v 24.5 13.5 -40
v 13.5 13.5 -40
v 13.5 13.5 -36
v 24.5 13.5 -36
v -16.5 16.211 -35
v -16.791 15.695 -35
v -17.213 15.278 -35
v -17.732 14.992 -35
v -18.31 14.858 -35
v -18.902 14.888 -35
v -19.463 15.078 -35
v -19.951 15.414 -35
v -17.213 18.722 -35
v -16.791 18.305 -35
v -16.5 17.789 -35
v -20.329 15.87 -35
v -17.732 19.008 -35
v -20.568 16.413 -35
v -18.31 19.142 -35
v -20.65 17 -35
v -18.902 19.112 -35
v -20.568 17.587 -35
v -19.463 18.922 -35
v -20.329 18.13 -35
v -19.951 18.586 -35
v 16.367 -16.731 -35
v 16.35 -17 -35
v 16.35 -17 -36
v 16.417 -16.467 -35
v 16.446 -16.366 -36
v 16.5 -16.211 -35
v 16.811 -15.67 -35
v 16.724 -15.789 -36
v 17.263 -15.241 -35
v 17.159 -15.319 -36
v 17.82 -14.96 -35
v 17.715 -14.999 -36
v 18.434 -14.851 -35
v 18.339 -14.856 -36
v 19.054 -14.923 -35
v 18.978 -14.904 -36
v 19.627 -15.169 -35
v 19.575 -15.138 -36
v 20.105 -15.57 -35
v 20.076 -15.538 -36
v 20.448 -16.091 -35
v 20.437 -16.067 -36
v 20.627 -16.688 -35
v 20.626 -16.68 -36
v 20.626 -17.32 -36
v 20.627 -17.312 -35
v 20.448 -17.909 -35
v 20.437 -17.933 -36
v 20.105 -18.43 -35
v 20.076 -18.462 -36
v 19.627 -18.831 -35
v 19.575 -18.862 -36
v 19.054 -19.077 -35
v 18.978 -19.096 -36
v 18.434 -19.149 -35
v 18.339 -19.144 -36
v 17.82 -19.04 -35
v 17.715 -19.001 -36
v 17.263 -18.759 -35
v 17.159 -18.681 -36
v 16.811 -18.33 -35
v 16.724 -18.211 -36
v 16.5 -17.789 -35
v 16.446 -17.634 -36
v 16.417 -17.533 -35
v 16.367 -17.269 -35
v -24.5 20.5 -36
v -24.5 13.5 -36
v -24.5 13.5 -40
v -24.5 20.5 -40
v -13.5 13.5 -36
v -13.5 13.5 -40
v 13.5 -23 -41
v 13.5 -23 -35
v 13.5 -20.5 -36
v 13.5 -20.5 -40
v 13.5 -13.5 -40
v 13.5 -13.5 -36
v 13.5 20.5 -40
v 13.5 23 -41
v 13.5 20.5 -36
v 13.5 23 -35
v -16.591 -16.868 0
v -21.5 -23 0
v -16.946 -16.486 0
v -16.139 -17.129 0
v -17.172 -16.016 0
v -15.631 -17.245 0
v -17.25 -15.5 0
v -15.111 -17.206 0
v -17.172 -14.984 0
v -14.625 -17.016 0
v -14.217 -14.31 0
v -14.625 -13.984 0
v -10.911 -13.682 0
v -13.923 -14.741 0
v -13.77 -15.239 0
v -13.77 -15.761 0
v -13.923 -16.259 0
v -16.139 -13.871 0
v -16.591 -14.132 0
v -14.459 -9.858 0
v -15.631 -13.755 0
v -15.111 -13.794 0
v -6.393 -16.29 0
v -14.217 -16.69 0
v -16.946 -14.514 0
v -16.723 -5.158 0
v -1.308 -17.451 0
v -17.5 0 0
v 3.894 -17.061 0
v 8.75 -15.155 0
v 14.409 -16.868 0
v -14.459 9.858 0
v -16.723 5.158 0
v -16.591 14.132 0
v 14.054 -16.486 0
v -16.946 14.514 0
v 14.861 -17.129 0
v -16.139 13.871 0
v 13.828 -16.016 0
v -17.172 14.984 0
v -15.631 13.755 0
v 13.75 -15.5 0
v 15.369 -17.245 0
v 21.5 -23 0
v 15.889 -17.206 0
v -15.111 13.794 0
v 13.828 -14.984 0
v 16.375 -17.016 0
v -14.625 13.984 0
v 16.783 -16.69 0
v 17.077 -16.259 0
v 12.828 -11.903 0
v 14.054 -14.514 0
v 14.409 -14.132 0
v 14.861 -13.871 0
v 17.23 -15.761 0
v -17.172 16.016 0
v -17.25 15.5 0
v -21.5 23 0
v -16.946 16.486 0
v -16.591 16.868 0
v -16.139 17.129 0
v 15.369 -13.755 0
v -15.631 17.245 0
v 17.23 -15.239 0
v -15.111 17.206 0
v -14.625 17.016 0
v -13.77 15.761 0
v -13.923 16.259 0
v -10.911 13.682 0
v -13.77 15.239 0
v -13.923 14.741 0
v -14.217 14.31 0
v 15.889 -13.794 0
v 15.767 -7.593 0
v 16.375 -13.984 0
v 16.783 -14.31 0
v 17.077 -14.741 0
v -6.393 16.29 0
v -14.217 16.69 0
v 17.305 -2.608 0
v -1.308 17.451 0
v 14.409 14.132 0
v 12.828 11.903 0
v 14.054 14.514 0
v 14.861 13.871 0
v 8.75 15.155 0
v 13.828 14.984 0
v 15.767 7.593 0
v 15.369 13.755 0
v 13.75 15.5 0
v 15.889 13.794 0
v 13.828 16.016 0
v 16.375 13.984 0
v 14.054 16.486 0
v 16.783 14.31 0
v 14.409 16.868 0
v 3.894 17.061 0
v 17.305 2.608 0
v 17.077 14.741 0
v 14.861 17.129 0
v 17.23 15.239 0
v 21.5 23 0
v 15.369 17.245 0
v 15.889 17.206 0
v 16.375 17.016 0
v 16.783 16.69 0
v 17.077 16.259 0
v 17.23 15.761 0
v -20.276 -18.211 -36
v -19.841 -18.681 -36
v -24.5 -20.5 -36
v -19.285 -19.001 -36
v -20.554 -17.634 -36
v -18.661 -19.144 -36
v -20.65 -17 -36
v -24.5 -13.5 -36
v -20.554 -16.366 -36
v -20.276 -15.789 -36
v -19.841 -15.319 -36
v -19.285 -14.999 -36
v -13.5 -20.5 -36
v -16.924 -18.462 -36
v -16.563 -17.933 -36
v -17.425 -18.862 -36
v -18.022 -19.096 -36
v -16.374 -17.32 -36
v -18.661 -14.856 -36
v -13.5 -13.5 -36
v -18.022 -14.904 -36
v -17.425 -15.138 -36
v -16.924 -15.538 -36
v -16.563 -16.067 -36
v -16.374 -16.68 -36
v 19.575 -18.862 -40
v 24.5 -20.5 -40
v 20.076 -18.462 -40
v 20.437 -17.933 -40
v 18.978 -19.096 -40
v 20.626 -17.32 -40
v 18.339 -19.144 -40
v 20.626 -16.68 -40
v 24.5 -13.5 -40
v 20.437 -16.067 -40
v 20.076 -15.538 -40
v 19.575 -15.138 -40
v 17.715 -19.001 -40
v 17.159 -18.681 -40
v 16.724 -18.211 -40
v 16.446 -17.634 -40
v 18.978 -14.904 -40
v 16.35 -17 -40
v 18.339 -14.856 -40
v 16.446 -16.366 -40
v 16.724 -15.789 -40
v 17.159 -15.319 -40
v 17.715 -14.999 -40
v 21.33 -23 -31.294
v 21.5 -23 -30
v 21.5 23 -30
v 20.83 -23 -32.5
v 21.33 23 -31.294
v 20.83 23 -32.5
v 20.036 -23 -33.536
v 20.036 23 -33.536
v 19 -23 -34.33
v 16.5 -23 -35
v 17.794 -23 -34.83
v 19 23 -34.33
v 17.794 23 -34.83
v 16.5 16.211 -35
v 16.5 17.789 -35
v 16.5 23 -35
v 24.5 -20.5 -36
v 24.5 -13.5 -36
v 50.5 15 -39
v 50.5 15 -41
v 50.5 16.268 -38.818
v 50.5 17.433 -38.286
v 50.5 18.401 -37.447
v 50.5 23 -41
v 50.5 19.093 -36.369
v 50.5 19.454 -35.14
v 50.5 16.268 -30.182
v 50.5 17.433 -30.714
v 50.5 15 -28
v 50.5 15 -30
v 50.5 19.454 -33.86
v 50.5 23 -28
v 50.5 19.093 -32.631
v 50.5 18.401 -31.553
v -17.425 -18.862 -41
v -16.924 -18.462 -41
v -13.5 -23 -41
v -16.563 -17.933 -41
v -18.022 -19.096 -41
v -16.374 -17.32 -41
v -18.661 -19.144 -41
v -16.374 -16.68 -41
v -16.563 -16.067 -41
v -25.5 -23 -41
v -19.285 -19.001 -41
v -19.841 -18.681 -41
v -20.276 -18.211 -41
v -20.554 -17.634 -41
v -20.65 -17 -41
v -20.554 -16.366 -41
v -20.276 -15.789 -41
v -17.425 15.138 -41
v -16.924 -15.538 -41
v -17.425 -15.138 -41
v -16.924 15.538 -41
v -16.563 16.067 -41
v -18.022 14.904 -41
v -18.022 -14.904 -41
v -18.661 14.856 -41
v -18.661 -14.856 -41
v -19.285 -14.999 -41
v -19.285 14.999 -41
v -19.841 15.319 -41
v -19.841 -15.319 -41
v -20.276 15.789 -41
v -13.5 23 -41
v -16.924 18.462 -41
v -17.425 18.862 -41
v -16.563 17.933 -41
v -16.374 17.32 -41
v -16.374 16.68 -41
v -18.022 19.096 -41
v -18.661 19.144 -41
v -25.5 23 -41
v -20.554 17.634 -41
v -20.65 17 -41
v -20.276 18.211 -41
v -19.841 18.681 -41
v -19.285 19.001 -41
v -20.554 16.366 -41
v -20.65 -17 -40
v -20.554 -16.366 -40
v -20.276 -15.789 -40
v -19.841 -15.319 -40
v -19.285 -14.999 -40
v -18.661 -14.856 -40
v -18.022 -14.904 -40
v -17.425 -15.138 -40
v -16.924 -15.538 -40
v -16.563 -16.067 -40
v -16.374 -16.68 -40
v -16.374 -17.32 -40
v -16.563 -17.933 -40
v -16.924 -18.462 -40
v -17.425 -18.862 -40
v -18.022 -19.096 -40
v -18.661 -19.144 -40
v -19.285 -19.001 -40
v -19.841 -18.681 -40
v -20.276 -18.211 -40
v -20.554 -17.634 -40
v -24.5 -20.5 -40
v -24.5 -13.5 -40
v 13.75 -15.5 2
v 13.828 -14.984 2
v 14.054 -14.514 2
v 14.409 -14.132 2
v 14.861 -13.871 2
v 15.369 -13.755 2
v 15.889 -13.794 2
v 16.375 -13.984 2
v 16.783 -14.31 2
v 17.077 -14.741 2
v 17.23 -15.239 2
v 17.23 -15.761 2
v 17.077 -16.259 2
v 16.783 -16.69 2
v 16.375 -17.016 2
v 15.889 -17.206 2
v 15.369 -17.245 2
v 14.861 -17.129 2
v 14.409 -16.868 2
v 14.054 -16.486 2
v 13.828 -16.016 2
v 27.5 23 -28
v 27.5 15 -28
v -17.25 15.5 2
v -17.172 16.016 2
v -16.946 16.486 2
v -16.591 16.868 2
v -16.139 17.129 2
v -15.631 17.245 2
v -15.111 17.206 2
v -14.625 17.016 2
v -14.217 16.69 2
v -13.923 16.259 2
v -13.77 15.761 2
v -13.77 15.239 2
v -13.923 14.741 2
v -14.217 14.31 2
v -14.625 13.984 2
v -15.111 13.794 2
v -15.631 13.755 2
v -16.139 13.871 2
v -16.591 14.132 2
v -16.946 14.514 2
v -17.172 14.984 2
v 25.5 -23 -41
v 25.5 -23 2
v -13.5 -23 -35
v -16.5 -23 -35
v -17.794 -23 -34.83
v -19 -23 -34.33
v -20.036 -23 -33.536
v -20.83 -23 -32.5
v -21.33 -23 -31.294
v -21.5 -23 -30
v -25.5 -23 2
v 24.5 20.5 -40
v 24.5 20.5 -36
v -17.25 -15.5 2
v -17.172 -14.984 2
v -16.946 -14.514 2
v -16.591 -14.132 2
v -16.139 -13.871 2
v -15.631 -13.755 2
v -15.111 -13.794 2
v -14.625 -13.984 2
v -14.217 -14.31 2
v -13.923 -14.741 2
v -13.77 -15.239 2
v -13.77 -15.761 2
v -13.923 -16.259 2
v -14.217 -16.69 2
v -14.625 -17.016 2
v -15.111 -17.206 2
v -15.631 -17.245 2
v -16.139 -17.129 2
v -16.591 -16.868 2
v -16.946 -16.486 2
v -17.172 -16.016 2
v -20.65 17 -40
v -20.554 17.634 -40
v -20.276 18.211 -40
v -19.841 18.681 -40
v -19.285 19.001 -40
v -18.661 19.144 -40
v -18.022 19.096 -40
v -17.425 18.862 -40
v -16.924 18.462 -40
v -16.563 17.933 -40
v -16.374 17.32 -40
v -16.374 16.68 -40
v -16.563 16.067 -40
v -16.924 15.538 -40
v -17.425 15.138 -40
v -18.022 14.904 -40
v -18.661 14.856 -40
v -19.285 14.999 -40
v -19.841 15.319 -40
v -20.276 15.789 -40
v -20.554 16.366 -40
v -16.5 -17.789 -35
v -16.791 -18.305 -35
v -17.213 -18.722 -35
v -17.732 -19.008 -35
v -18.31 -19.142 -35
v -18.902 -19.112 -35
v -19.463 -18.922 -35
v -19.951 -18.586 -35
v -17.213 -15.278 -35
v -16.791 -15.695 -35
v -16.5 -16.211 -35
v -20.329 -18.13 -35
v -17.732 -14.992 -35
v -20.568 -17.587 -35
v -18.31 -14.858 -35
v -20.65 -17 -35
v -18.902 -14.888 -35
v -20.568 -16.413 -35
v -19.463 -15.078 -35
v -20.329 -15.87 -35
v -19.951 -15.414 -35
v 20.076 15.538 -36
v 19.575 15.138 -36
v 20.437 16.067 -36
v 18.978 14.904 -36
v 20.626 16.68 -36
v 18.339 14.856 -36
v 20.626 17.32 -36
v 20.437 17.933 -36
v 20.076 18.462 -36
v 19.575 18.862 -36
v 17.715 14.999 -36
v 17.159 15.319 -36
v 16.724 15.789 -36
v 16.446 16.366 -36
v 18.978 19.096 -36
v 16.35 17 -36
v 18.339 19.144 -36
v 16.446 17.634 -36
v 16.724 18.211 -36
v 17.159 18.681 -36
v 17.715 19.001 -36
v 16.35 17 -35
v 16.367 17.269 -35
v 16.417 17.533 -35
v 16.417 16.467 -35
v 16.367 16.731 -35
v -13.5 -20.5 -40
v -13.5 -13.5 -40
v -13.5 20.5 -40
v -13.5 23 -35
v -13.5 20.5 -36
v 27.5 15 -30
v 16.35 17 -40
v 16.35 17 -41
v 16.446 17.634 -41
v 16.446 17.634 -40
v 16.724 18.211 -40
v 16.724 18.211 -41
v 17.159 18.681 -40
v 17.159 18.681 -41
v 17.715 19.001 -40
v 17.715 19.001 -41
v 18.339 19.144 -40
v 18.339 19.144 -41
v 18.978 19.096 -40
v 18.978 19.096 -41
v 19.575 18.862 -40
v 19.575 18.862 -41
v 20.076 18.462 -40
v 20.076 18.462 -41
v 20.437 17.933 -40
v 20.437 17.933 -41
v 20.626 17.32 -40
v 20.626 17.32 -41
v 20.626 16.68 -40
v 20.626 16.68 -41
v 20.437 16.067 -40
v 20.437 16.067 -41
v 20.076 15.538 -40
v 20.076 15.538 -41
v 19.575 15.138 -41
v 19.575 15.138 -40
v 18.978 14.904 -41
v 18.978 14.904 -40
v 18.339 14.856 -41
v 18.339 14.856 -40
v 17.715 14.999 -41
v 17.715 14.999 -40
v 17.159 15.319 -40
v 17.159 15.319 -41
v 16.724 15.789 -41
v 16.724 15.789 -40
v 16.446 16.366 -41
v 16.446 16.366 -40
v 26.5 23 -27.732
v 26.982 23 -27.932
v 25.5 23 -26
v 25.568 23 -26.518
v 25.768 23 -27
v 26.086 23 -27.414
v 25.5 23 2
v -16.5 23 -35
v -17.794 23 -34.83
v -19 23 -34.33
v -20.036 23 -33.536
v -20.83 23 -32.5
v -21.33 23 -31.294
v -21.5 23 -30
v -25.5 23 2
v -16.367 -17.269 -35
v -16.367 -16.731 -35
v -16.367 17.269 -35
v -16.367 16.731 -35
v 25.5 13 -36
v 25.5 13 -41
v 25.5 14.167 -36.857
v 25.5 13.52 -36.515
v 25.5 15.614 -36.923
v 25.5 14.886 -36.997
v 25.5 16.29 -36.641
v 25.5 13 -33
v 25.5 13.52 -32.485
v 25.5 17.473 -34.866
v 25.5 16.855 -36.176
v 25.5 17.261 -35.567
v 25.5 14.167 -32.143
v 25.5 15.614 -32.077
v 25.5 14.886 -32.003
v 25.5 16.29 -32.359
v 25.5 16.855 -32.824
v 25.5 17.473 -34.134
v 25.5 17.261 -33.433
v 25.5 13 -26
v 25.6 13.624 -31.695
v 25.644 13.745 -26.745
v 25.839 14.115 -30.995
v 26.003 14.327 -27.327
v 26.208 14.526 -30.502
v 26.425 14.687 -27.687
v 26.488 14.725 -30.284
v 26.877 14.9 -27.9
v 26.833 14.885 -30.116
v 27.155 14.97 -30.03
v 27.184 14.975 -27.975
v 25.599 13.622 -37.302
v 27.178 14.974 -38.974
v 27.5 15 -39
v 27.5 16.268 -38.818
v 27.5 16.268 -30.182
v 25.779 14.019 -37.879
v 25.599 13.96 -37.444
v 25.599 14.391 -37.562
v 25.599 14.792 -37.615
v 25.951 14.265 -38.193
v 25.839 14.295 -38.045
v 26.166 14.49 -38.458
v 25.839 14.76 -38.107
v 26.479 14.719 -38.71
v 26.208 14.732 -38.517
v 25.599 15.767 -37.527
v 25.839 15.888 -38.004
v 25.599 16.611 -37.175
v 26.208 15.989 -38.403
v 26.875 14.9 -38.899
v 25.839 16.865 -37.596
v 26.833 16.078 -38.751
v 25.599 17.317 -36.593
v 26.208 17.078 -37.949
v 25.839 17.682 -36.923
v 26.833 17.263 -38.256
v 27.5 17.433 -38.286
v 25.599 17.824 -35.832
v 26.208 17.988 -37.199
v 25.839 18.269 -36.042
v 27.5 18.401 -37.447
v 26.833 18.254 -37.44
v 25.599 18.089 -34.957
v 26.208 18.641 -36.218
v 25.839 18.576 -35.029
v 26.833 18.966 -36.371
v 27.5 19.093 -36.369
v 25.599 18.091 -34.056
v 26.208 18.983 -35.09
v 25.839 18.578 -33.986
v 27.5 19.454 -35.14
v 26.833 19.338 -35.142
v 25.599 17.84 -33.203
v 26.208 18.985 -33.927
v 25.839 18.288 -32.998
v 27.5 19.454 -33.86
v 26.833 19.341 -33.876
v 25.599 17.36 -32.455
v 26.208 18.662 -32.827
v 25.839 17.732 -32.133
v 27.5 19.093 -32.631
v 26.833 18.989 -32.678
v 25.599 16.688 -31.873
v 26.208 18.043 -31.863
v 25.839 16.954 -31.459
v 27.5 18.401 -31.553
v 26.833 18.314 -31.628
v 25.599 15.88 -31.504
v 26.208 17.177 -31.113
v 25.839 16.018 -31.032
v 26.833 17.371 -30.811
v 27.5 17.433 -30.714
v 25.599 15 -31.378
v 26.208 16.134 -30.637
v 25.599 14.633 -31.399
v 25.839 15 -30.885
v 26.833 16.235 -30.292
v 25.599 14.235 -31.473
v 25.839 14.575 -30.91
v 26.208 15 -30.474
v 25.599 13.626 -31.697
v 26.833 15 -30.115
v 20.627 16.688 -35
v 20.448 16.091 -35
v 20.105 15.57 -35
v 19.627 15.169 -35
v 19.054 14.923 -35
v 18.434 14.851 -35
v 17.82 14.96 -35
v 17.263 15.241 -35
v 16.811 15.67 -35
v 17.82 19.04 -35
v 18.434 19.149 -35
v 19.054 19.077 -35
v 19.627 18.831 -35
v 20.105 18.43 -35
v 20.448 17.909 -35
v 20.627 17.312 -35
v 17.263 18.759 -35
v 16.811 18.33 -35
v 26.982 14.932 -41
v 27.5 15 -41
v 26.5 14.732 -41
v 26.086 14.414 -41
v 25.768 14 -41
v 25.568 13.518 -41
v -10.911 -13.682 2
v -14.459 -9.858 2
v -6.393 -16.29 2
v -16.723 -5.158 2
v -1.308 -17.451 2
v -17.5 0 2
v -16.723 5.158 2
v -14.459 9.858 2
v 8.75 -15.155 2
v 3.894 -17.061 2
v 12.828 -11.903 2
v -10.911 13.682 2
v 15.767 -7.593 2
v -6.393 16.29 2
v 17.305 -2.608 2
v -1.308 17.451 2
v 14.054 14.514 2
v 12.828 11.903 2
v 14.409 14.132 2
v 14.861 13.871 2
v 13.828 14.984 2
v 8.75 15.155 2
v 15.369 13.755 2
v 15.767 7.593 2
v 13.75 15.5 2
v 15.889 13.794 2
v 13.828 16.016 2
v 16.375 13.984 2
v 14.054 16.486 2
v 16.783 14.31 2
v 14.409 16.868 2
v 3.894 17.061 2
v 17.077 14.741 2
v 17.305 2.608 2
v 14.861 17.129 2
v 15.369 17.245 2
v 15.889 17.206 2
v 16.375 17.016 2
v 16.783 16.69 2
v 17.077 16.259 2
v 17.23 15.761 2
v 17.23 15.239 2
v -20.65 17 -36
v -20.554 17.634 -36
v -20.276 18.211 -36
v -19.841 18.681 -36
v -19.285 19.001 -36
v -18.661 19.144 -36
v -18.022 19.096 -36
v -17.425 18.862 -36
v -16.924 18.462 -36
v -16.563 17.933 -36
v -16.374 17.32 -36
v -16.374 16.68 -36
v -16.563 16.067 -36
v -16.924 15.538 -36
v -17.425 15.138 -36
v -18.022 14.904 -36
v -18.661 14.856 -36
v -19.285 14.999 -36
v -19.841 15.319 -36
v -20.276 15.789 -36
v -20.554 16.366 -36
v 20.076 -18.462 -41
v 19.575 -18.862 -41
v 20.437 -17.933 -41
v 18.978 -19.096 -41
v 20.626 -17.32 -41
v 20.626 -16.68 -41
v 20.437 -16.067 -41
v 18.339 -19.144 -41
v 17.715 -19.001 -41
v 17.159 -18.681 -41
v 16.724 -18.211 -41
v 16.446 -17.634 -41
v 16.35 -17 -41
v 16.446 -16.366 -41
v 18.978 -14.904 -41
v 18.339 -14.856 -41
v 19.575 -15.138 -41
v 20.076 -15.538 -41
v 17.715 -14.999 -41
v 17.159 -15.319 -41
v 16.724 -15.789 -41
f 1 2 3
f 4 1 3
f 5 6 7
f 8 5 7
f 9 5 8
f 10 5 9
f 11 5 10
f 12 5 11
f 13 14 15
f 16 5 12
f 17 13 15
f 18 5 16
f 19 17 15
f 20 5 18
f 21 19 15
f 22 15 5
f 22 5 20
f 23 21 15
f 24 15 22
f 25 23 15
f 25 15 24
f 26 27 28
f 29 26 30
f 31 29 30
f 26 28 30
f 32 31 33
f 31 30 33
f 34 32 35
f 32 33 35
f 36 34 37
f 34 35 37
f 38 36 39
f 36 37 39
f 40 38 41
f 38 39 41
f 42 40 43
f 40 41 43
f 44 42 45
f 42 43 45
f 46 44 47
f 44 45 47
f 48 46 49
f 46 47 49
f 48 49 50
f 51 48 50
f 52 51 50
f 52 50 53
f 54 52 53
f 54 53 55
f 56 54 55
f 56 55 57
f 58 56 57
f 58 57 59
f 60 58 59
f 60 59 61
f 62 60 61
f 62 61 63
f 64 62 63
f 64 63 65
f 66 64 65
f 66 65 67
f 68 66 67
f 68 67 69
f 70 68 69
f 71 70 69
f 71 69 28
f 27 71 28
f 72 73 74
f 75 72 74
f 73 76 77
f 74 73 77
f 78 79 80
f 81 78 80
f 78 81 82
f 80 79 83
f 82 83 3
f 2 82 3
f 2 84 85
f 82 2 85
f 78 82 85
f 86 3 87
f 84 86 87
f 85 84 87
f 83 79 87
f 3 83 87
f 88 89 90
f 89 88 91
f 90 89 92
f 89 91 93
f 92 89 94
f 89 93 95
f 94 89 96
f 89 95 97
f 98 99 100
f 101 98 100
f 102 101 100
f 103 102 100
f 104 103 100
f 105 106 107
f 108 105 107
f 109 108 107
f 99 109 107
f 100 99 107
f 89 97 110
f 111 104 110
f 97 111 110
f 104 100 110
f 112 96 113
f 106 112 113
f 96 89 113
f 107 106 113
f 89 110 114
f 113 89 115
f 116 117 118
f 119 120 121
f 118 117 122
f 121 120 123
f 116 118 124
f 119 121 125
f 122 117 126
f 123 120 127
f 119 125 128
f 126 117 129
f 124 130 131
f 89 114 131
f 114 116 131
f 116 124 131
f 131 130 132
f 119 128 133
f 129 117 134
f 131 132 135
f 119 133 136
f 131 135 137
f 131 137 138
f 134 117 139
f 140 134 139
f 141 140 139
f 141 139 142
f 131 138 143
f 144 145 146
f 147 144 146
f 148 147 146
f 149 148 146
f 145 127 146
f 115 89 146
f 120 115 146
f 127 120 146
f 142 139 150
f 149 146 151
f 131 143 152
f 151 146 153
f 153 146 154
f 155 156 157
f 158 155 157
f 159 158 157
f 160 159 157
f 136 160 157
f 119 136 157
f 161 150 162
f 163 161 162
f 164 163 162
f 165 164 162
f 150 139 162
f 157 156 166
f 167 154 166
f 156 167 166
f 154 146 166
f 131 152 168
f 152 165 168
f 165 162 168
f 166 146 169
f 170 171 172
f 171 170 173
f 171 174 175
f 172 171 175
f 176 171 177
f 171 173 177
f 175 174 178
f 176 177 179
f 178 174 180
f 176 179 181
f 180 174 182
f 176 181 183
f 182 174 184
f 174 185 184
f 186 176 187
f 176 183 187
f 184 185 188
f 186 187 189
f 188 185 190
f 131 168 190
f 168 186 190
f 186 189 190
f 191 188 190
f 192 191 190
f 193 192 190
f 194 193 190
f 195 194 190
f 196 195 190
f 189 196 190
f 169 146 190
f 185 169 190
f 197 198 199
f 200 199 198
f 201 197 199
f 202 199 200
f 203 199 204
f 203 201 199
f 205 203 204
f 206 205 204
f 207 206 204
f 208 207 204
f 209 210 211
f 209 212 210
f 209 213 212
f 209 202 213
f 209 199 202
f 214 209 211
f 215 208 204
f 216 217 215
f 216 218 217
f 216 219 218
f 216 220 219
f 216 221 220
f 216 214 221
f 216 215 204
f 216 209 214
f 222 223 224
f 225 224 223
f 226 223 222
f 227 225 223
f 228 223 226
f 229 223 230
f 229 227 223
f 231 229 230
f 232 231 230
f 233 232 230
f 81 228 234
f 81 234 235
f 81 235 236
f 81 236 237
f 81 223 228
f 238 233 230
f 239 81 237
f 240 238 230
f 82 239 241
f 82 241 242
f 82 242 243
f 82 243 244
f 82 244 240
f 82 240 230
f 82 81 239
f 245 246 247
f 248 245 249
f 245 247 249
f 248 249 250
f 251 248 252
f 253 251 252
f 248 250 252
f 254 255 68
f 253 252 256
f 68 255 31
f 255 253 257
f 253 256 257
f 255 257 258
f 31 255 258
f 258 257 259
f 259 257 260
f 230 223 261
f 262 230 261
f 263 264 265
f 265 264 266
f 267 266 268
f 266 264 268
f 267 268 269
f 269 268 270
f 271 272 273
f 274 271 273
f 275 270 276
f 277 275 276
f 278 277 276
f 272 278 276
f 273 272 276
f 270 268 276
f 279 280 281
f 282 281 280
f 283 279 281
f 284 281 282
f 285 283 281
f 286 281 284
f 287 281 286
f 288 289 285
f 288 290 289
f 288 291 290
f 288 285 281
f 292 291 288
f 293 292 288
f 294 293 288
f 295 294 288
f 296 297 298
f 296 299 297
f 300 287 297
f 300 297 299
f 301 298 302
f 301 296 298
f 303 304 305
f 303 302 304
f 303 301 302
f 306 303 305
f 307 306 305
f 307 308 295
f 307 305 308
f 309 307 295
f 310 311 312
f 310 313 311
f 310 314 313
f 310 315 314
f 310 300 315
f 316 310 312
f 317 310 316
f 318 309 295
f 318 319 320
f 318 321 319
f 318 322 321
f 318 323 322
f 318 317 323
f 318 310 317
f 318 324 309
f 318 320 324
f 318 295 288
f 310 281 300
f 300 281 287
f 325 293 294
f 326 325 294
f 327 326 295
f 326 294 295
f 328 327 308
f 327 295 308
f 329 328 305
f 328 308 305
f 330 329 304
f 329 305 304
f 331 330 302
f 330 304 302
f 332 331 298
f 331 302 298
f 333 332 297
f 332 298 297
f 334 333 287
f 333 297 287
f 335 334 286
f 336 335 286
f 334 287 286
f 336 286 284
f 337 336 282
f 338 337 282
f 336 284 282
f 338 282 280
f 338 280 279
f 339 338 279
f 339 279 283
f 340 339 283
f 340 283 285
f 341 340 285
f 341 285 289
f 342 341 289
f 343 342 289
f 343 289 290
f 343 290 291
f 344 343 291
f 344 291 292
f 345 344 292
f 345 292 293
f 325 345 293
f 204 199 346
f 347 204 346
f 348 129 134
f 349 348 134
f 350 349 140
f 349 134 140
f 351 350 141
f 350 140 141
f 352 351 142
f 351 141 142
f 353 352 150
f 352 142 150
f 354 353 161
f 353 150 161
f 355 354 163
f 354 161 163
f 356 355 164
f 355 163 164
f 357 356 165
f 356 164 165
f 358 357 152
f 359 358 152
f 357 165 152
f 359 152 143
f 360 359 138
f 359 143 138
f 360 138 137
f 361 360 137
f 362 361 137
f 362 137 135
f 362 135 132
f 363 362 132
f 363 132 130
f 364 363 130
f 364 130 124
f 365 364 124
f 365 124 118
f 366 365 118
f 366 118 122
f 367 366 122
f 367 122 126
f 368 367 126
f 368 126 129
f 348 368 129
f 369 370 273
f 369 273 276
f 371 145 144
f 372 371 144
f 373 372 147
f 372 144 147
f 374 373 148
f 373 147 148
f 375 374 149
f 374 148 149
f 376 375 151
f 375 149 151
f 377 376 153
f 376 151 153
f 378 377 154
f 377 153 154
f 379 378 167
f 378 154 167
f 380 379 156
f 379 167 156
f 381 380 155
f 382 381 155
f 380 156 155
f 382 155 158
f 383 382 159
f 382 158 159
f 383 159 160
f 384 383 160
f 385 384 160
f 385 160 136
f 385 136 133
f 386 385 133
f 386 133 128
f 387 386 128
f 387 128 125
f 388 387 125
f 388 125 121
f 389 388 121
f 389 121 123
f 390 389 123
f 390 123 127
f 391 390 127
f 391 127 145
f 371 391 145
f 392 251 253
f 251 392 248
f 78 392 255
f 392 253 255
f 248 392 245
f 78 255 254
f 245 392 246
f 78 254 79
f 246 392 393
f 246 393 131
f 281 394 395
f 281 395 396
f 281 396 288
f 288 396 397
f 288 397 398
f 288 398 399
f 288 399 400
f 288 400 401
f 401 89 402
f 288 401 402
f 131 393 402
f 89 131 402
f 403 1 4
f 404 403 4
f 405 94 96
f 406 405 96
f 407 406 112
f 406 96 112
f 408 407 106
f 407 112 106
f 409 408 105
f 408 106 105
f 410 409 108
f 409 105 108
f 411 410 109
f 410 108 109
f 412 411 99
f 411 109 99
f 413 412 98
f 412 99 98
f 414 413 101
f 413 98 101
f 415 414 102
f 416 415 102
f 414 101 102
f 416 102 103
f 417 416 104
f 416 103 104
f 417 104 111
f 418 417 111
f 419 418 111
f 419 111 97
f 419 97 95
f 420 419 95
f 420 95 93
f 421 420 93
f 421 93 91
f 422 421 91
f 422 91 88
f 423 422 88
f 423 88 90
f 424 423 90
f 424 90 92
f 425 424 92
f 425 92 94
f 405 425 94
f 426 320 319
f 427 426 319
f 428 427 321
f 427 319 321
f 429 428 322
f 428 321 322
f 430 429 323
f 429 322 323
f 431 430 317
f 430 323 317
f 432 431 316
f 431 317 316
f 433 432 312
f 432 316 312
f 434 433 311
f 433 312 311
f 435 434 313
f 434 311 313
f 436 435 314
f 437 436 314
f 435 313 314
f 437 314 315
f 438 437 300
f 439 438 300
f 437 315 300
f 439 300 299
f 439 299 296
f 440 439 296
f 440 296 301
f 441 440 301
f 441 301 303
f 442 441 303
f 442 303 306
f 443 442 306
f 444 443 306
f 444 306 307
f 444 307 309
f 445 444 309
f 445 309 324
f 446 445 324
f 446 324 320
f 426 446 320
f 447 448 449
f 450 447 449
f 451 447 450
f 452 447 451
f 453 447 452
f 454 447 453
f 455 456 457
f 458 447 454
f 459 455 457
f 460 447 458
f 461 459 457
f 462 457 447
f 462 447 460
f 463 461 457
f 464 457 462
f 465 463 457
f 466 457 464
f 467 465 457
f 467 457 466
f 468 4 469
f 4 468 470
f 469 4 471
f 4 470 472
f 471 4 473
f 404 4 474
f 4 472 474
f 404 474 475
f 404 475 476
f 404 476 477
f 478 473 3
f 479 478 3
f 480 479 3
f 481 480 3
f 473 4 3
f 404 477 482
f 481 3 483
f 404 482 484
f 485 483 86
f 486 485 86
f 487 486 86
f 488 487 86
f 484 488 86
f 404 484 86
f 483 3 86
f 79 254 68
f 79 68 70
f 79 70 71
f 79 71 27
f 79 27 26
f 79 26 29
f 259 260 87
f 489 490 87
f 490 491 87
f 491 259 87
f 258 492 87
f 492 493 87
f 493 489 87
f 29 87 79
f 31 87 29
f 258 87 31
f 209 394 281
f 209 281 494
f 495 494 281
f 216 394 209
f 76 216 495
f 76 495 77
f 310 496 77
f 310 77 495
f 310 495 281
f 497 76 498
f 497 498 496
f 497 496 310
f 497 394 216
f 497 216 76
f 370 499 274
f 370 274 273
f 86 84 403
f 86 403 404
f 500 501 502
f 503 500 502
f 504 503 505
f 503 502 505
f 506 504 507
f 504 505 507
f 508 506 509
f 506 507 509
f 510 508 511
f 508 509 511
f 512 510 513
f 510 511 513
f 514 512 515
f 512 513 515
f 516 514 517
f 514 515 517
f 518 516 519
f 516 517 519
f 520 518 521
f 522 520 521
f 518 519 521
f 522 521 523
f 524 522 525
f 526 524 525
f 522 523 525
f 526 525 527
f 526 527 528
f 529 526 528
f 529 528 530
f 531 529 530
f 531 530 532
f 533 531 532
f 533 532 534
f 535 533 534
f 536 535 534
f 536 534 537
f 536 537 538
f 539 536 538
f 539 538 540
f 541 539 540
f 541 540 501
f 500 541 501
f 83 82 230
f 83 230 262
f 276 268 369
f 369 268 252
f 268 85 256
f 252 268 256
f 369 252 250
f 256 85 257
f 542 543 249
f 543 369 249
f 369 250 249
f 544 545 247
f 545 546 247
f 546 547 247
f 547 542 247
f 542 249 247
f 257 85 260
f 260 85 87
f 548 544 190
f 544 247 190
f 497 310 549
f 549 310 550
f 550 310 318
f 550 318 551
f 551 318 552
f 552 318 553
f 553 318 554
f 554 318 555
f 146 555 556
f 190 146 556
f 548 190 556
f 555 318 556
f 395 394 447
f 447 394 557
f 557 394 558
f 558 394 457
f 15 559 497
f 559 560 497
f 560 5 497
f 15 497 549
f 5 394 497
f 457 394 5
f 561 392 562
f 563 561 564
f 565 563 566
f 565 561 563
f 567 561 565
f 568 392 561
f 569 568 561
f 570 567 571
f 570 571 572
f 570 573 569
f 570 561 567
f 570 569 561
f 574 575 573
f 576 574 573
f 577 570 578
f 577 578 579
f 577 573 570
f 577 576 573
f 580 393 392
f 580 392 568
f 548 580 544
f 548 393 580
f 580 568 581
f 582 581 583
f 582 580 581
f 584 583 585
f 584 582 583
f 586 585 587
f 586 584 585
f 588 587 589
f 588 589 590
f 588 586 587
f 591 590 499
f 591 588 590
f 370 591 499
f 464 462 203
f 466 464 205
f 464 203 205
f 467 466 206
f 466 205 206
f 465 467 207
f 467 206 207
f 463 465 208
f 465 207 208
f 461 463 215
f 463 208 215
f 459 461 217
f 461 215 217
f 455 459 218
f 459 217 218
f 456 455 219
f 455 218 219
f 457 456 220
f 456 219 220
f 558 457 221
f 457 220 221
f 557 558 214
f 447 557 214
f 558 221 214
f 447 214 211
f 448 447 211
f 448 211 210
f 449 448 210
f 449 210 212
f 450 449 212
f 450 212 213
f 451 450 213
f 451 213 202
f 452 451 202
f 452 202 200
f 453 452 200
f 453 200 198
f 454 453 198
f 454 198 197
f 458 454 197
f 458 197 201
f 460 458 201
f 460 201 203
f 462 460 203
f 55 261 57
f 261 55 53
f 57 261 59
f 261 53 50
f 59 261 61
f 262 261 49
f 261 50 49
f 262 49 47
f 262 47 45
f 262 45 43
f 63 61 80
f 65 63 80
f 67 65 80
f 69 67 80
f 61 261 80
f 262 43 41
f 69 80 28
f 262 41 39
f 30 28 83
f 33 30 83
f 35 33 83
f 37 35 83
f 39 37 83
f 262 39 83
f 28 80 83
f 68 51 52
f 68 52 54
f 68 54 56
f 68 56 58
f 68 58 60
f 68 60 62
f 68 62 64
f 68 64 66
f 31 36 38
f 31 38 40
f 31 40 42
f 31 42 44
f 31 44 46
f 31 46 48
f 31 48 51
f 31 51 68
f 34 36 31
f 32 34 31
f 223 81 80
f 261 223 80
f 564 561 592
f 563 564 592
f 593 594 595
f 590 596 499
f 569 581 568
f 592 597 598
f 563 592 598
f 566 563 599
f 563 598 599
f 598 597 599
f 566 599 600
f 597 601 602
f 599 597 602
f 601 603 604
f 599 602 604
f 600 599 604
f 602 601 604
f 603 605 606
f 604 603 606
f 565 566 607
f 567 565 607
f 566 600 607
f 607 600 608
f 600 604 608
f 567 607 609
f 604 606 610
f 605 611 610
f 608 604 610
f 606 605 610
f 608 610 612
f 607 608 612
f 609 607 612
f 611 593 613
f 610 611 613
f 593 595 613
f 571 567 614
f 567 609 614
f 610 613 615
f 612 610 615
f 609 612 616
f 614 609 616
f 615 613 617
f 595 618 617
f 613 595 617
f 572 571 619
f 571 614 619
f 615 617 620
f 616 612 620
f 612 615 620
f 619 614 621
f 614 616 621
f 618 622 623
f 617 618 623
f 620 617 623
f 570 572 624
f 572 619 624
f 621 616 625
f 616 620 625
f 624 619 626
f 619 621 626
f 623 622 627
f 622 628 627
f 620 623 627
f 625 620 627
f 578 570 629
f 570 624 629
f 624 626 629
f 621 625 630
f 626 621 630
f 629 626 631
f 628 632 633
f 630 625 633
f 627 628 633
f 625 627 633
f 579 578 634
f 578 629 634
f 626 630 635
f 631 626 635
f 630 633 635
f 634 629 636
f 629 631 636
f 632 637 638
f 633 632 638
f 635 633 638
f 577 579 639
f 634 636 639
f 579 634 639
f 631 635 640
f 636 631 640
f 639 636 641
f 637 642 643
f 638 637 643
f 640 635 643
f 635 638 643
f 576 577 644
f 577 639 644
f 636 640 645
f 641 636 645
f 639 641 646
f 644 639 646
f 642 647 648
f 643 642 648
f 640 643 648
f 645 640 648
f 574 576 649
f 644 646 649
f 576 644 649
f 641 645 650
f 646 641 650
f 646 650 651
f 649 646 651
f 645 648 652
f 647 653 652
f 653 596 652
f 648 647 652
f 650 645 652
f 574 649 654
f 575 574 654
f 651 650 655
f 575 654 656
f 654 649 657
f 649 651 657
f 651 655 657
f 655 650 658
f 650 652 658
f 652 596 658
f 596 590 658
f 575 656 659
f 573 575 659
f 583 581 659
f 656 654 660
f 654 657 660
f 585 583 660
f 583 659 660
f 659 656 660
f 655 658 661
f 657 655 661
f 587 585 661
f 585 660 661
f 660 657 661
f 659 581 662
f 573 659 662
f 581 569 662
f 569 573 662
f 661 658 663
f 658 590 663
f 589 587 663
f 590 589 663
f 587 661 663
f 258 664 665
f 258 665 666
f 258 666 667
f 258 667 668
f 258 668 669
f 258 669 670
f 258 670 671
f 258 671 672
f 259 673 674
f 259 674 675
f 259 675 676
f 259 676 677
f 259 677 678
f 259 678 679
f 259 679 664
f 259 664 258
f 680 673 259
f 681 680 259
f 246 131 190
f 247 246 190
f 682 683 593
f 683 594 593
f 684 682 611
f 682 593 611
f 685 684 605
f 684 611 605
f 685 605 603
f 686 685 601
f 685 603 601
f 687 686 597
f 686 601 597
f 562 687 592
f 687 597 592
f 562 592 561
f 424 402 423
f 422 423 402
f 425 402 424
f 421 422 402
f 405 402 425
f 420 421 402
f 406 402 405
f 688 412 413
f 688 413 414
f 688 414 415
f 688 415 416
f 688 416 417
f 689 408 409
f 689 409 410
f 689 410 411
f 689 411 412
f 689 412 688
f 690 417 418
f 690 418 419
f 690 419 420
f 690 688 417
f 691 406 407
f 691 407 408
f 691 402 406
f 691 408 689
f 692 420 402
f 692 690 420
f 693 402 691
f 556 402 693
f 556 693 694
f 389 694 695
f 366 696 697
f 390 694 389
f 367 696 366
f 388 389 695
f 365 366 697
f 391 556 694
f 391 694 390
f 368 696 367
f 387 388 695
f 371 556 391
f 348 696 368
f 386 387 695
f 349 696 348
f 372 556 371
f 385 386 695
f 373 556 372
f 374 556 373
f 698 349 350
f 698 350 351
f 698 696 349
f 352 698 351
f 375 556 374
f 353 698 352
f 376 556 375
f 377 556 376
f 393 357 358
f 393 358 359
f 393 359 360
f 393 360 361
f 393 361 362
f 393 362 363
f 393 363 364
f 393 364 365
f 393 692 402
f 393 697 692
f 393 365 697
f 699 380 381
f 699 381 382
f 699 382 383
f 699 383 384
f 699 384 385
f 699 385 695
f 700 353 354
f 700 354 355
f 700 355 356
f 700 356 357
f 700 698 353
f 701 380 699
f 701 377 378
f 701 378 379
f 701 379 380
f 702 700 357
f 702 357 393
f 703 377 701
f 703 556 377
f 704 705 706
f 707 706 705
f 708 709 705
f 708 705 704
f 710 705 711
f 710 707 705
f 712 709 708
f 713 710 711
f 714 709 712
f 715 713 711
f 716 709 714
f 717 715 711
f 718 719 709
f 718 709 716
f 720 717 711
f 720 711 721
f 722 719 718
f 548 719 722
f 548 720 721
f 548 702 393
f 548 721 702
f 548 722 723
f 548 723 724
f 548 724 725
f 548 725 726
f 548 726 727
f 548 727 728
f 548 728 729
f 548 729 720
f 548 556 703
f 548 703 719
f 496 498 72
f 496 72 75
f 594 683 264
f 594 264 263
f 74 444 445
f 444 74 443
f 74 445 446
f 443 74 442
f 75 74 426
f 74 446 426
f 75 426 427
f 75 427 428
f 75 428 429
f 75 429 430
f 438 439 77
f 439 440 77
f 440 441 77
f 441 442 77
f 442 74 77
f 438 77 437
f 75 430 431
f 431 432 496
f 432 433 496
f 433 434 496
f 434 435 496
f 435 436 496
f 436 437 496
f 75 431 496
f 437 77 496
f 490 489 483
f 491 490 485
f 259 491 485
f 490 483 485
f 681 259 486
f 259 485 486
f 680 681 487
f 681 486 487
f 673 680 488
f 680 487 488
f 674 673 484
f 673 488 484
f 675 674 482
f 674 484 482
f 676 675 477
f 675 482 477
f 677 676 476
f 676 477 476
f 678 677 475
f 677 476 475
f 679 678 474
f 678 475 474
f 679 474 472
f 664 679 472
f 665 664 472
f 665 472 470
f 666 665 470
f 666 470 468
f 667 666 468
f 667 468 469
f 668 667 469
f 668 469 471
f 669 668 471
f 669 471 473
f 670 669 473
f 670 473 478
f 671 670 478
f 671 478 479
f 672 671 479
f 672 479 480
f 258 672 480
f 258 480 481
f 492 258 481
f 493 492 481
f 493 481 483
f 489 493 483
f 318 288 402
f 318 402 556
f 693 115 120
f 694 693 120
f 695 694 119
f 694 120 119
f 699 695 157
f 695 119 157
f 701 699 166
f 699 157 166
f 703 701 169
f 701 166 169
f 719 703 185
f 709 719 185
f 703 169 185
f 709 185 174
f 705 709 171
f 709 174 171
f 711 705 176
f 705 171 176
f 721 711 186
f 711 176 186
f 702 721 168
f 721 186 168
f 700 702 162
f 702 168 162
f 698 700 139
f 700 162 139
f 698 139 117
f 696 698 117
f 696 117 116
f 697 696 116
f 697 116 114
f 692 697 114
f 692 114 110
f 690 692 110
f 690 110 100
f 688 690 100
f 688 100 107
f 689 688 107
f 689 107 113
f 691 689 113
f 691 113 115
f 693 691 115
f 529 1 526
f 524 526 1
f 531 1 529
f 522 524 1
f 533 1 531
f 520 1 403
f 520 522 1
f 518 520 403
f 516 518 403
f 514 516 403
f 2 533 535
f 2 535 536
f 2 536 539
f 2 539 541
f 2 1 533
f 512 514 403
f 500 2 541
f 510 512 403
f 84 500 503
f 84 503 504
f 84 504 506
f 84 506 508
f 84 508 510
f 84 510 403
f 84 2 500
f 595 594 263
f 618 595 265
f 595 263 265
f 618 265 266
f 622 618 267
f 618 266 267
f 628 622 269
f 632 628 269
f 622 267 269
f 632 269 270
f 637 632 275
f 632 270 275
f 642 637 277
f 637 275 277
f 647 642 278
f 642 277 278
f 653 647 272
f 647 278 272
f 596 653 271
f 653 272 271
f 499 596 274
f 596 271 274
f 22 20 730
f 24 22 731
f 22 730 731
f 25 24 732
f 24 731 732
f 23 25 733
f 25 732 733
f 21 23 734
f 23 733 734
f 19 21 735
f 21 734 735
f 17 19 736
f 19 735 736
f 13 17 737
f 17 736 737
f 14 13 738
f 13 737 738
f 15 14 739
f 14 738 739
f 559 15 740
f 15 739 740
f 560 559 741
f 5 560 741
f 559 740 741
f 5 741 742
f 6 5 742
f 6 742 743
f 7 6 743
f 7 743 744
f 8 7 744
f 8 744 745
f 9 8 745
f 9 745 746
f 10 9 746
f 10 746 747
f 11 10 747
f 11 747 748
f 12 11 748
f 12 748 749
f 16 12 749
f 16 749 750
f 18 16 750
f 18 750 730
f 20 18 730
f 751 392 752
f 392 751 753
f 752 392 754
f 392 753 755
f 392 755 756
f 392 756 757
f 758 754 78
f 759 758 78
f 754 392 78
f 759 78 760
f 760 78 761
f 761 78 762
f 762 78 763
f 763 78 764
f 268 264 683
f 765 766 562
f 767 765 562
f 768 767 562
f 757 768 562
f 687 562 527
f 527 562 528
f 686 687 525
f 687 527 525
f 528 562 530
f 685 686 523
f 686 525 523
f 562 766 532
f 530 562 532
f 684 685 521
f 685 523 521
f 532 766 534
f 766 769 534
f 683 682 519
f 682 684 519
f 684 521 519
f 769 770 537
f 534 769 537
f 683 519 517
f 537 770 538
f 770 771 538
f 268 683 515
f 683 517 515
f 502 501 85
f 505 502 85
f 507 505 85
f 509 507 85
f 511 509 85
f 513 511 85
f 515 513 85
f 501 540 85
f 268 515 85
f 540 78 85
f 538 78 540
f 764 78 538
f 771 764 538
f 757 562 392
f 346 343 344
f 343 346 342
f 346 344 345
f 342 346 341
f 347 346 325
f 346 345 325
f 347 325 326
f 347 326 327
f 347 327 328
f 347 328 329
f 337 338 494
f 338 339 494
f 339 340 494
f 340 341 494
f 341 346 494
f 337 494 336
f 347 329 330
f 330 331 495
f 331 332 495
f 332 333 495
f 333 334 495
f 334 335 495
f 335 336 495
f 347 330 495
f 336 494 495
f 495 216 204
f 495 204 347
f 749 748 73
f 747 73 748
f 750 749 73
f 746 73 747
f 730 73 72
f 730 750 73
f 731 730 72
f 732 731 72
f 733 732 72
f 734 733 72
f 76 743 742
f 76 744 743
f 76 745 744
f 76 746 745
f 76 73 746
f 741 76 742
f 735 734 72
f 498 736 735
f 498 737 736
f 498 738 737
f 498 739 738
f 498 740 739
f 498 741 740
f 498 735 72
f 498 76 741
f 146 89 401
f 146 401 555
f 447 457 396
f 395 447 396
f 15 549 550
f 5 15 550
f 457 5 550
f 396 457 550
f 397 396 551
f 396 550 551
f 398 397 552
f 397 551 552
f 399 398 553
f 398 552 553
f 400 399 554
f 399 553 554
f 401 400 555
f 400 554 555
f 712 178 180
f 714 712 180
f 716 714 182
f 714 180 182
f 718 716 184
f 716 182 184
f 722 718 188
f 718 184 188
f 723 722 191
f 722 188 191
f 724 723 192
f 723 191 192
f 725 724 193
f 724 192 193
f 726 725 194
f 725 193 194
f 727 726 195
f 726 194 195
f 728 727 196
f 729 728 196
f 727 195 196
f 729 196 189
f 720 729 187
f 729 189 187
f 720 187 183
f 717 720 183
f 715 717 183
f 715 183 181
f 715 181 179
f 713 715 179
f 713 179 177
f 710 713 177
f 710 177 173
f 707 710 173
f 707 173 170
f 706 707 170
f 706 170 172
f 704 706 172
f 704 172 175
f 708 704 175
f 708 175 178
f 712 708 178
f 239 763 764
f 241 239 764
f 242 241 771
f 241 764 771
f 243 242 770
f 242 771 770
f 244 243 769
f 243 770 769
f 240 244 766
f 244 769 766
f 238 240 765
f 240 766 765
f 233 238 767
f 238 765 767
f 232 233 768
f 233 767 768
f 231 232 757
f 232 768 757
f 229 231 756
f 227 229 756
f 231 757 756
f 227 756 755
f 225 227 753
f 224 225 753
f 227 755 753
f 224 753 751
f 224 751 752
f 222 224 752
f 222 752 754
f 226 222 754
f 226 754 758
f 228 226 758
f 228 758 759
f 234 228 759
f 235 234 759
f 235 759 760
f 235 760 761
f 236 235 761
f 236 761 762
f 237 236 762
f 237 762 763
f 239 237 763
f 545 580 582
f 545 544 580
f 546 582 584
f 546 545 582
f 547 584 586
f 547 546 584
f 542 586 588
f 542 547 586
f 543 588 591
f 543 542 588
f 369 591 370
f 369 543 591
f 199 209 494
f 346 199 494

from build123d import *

# Parameters (mm, degrees)
SKETCH1_W           = 51
SKETCH1_H           = 46
BOSS_EXTRUDE1_DEPTH = 2
SKETCH2_W           = 4
SKETCH2_H           = 46
BOSS_EXTRUDE2_DEPTH = 35
SKETCH3_R           = 1.75
CUT_EXTRUDE1_DEPTH  = 30
SKETCH4_W           = 12
SKETCH4_H           = 46
BOSS_EXTRUDE3_DEPTH = 6
FILLET1_R           = 5
SKETCH5_R           = 2.15
CUT_EXTRUDE2_DEPTH  = 6
SKETCH6_W           = 4
SKETCH6_H           = 7
CUT_EXTRUDE3_DEPTH  = 11
SKETCH7_W           = 4
SKETCH7_H           = 7
CUT_EXTRUDE4_DEPTH  = 11
SKETCH8_R           = 17.5
CUT_EXTRUDE5_DEPTH  = 11
SKETCH9_W           = 13
SKETCH9_H           = 8
BOSS_EXTRUDE4_DEPTH = 25
SKETCH10_R          = 4.5
CUT_EXTRUDE6_DEPTH  = 25
FILLET2_R           = 2


with BuildPart() as part:
    # Sketch1 → Boss-Extrude1 (new body)
    with BuildSketch(Plane.XY):
        Rectangle(SKETCH1_W, SKETCH1_H)
    extrude(amount=BOSS_EXTRUDE1_DEPTH)

    # Sketch2 → Boss-Extrude2 (add)
    with BuildSketch(Plane.XY):
        with Locations((23.5, 0)):
            Rectangle(SKETCH2_W, SKETCH2_H)
        with Locations((-23.5, 0)):
            Rectangle(SKETCH2_W, SKETCH2_H)
    extrude(amount=-BOSS_EXTRUDE2_DEPTH)

    # Sketch3 → Cut-Extrude1 (cut)
    with BuildSketch(Plane(origin=(0, 0, 0), x_dir=(-1, 0, 0), z_dir=(0, 0, -1))):
        with Locations((15.5, -15.5)):
            Circle(SKETCH3_R)
        with Locations((-15.5, -15.5)):
            Circle(SKETCH3_R)
        with Locations((-15.5, 15.5)):
            Circle(SKETCH3_R)
        with Locations((15.5, 15.5)):
            Circle(SKETCH3_R)
    extrude(amount=-CUT_EXTRUDE1_DEPTH, mode=Mode.SUBTRACT)

    # Sketch4 → Boss-Extrude3 (add)
    with BuildSketch(Plane(origin=(0, 0, -35), x_dir=(-1, 0, 0), z_dir=(0, 0, -1))):
        with Locations((-19.5, 0)):
            Rectangle(SKETCH4_W, SKETCH4_H)
        with Locations((19.5, 0)):
            Rectangle(SKETCH4_W, SKETCH4_H)
    extrude(amount=BOSS_EXTRUDE3_DEPTH)

    # Fillet1
    fillet1_edges = [part.edges().sort_by_distance(p)[0] for p in [
        (21.5, 0, -35),
        (-21.5, 0, -35),
    ]]
    fillet(fillet1_edges, radius=FILLET1_R)

    # Sketch5 → Cut-Extrude2 (cut)
    with BuildSketch(Plane(origin=(0, 0, -41), x_dir=(-1, 0, 0), z_dir=(0, 0, -1))):
        with Locations((-18.5, -17)):
            Circle(SKETCH5_R)
        with Locations((-18.5, 17)):
            Circle(SKETCH5_R)
        with Locations((18.5, 17)):
            Circle(SKETCH5_R)
        with Locations((18.5, -17)):
            Circle(SKETCH5_R)
    extrude(amount=-CUT_EXTRUDE2_DEPTH, mode=Mode.SUBTRACT)

    # Sketch6 → Cut-Extrude3 (cut)
    with BuildSketch(Plane(origin=(-13.5, 0, 0), x_dir=(0, 0, -1), z_dir=(1, 0, 0))):
        with Locations((38, 17)):
            Rectangle(SKETCH6_W, SKETCH6_H)
        with Locations((38, -17)):
            Rectangle(SKETCH6_W, SKETCH6_H)
    extrude(amount=-CUT_EXTRUDE3_DEPTH, mode=Mode.SUBTRACT)

    # Sketch7 → Cut-Extrude4 (cut)
    with BuildSketch(Plane.ZY.offset(-13.5)):
        with Locations((-38, -17)):
            Rectangle(SKETCH7_W, SKETCH7_H)
        with Locations((-38, 17)):
            Rectangle(SKETCH7_W, SKETCH7_H)
    extrude(amount=-CUT_EXTRUDE4_DEPTH, mode=Mode.SUBTRACT)

    # Sketch8 → Cut-Extrude5 (cut)
    with BuildSketch(Plane(origin=(0, 0, 0), x_dir=(-1, 0, 0), z_dir=(0, 0, -1))):
        Circle(SKETCH8_R)
    extrude(amount=-CUT_EXTRUDE5_DEPTH, mode=Mode.SUBTRACT)

    # Sketch9 → Boss-Extrude4 (add)
    with BuildSketch(Plane.ZY.offset(-25.5)):
        with Locations((-34.5, 19)):
            Rectangle(SKETCH9_W, SKETCH9_H)
    extrude(amount=-BOSS_EXTRUDE4_DEPTH)

    # Sketch10 → Cut-Extrude6 (cut)
    with BuildSketch(Plane(origin=(50.5, 0, 0), x_dir=(0, 0, -1), z_dir=(1, 0, 0))):
        with Locations((34.5, 15)):
            Circle(SKETCH10_R)
    extrude(amount=-CUT_EXTRUDE6_DEPTH, mode=Mode.SUBTRACT)

    # Fillet2
    fillet2_edges = [part.edges().sort_by_distance(p)[0] for p in [
        (25.5, 19, -28),
        (25.5, 15, -29),
        (25.5, 19.5, -34.5),
        (25.5, 15, -40),
    ]]
    fillet(fillet2_edges, radius=FILLET2_R)


solid = part.part
